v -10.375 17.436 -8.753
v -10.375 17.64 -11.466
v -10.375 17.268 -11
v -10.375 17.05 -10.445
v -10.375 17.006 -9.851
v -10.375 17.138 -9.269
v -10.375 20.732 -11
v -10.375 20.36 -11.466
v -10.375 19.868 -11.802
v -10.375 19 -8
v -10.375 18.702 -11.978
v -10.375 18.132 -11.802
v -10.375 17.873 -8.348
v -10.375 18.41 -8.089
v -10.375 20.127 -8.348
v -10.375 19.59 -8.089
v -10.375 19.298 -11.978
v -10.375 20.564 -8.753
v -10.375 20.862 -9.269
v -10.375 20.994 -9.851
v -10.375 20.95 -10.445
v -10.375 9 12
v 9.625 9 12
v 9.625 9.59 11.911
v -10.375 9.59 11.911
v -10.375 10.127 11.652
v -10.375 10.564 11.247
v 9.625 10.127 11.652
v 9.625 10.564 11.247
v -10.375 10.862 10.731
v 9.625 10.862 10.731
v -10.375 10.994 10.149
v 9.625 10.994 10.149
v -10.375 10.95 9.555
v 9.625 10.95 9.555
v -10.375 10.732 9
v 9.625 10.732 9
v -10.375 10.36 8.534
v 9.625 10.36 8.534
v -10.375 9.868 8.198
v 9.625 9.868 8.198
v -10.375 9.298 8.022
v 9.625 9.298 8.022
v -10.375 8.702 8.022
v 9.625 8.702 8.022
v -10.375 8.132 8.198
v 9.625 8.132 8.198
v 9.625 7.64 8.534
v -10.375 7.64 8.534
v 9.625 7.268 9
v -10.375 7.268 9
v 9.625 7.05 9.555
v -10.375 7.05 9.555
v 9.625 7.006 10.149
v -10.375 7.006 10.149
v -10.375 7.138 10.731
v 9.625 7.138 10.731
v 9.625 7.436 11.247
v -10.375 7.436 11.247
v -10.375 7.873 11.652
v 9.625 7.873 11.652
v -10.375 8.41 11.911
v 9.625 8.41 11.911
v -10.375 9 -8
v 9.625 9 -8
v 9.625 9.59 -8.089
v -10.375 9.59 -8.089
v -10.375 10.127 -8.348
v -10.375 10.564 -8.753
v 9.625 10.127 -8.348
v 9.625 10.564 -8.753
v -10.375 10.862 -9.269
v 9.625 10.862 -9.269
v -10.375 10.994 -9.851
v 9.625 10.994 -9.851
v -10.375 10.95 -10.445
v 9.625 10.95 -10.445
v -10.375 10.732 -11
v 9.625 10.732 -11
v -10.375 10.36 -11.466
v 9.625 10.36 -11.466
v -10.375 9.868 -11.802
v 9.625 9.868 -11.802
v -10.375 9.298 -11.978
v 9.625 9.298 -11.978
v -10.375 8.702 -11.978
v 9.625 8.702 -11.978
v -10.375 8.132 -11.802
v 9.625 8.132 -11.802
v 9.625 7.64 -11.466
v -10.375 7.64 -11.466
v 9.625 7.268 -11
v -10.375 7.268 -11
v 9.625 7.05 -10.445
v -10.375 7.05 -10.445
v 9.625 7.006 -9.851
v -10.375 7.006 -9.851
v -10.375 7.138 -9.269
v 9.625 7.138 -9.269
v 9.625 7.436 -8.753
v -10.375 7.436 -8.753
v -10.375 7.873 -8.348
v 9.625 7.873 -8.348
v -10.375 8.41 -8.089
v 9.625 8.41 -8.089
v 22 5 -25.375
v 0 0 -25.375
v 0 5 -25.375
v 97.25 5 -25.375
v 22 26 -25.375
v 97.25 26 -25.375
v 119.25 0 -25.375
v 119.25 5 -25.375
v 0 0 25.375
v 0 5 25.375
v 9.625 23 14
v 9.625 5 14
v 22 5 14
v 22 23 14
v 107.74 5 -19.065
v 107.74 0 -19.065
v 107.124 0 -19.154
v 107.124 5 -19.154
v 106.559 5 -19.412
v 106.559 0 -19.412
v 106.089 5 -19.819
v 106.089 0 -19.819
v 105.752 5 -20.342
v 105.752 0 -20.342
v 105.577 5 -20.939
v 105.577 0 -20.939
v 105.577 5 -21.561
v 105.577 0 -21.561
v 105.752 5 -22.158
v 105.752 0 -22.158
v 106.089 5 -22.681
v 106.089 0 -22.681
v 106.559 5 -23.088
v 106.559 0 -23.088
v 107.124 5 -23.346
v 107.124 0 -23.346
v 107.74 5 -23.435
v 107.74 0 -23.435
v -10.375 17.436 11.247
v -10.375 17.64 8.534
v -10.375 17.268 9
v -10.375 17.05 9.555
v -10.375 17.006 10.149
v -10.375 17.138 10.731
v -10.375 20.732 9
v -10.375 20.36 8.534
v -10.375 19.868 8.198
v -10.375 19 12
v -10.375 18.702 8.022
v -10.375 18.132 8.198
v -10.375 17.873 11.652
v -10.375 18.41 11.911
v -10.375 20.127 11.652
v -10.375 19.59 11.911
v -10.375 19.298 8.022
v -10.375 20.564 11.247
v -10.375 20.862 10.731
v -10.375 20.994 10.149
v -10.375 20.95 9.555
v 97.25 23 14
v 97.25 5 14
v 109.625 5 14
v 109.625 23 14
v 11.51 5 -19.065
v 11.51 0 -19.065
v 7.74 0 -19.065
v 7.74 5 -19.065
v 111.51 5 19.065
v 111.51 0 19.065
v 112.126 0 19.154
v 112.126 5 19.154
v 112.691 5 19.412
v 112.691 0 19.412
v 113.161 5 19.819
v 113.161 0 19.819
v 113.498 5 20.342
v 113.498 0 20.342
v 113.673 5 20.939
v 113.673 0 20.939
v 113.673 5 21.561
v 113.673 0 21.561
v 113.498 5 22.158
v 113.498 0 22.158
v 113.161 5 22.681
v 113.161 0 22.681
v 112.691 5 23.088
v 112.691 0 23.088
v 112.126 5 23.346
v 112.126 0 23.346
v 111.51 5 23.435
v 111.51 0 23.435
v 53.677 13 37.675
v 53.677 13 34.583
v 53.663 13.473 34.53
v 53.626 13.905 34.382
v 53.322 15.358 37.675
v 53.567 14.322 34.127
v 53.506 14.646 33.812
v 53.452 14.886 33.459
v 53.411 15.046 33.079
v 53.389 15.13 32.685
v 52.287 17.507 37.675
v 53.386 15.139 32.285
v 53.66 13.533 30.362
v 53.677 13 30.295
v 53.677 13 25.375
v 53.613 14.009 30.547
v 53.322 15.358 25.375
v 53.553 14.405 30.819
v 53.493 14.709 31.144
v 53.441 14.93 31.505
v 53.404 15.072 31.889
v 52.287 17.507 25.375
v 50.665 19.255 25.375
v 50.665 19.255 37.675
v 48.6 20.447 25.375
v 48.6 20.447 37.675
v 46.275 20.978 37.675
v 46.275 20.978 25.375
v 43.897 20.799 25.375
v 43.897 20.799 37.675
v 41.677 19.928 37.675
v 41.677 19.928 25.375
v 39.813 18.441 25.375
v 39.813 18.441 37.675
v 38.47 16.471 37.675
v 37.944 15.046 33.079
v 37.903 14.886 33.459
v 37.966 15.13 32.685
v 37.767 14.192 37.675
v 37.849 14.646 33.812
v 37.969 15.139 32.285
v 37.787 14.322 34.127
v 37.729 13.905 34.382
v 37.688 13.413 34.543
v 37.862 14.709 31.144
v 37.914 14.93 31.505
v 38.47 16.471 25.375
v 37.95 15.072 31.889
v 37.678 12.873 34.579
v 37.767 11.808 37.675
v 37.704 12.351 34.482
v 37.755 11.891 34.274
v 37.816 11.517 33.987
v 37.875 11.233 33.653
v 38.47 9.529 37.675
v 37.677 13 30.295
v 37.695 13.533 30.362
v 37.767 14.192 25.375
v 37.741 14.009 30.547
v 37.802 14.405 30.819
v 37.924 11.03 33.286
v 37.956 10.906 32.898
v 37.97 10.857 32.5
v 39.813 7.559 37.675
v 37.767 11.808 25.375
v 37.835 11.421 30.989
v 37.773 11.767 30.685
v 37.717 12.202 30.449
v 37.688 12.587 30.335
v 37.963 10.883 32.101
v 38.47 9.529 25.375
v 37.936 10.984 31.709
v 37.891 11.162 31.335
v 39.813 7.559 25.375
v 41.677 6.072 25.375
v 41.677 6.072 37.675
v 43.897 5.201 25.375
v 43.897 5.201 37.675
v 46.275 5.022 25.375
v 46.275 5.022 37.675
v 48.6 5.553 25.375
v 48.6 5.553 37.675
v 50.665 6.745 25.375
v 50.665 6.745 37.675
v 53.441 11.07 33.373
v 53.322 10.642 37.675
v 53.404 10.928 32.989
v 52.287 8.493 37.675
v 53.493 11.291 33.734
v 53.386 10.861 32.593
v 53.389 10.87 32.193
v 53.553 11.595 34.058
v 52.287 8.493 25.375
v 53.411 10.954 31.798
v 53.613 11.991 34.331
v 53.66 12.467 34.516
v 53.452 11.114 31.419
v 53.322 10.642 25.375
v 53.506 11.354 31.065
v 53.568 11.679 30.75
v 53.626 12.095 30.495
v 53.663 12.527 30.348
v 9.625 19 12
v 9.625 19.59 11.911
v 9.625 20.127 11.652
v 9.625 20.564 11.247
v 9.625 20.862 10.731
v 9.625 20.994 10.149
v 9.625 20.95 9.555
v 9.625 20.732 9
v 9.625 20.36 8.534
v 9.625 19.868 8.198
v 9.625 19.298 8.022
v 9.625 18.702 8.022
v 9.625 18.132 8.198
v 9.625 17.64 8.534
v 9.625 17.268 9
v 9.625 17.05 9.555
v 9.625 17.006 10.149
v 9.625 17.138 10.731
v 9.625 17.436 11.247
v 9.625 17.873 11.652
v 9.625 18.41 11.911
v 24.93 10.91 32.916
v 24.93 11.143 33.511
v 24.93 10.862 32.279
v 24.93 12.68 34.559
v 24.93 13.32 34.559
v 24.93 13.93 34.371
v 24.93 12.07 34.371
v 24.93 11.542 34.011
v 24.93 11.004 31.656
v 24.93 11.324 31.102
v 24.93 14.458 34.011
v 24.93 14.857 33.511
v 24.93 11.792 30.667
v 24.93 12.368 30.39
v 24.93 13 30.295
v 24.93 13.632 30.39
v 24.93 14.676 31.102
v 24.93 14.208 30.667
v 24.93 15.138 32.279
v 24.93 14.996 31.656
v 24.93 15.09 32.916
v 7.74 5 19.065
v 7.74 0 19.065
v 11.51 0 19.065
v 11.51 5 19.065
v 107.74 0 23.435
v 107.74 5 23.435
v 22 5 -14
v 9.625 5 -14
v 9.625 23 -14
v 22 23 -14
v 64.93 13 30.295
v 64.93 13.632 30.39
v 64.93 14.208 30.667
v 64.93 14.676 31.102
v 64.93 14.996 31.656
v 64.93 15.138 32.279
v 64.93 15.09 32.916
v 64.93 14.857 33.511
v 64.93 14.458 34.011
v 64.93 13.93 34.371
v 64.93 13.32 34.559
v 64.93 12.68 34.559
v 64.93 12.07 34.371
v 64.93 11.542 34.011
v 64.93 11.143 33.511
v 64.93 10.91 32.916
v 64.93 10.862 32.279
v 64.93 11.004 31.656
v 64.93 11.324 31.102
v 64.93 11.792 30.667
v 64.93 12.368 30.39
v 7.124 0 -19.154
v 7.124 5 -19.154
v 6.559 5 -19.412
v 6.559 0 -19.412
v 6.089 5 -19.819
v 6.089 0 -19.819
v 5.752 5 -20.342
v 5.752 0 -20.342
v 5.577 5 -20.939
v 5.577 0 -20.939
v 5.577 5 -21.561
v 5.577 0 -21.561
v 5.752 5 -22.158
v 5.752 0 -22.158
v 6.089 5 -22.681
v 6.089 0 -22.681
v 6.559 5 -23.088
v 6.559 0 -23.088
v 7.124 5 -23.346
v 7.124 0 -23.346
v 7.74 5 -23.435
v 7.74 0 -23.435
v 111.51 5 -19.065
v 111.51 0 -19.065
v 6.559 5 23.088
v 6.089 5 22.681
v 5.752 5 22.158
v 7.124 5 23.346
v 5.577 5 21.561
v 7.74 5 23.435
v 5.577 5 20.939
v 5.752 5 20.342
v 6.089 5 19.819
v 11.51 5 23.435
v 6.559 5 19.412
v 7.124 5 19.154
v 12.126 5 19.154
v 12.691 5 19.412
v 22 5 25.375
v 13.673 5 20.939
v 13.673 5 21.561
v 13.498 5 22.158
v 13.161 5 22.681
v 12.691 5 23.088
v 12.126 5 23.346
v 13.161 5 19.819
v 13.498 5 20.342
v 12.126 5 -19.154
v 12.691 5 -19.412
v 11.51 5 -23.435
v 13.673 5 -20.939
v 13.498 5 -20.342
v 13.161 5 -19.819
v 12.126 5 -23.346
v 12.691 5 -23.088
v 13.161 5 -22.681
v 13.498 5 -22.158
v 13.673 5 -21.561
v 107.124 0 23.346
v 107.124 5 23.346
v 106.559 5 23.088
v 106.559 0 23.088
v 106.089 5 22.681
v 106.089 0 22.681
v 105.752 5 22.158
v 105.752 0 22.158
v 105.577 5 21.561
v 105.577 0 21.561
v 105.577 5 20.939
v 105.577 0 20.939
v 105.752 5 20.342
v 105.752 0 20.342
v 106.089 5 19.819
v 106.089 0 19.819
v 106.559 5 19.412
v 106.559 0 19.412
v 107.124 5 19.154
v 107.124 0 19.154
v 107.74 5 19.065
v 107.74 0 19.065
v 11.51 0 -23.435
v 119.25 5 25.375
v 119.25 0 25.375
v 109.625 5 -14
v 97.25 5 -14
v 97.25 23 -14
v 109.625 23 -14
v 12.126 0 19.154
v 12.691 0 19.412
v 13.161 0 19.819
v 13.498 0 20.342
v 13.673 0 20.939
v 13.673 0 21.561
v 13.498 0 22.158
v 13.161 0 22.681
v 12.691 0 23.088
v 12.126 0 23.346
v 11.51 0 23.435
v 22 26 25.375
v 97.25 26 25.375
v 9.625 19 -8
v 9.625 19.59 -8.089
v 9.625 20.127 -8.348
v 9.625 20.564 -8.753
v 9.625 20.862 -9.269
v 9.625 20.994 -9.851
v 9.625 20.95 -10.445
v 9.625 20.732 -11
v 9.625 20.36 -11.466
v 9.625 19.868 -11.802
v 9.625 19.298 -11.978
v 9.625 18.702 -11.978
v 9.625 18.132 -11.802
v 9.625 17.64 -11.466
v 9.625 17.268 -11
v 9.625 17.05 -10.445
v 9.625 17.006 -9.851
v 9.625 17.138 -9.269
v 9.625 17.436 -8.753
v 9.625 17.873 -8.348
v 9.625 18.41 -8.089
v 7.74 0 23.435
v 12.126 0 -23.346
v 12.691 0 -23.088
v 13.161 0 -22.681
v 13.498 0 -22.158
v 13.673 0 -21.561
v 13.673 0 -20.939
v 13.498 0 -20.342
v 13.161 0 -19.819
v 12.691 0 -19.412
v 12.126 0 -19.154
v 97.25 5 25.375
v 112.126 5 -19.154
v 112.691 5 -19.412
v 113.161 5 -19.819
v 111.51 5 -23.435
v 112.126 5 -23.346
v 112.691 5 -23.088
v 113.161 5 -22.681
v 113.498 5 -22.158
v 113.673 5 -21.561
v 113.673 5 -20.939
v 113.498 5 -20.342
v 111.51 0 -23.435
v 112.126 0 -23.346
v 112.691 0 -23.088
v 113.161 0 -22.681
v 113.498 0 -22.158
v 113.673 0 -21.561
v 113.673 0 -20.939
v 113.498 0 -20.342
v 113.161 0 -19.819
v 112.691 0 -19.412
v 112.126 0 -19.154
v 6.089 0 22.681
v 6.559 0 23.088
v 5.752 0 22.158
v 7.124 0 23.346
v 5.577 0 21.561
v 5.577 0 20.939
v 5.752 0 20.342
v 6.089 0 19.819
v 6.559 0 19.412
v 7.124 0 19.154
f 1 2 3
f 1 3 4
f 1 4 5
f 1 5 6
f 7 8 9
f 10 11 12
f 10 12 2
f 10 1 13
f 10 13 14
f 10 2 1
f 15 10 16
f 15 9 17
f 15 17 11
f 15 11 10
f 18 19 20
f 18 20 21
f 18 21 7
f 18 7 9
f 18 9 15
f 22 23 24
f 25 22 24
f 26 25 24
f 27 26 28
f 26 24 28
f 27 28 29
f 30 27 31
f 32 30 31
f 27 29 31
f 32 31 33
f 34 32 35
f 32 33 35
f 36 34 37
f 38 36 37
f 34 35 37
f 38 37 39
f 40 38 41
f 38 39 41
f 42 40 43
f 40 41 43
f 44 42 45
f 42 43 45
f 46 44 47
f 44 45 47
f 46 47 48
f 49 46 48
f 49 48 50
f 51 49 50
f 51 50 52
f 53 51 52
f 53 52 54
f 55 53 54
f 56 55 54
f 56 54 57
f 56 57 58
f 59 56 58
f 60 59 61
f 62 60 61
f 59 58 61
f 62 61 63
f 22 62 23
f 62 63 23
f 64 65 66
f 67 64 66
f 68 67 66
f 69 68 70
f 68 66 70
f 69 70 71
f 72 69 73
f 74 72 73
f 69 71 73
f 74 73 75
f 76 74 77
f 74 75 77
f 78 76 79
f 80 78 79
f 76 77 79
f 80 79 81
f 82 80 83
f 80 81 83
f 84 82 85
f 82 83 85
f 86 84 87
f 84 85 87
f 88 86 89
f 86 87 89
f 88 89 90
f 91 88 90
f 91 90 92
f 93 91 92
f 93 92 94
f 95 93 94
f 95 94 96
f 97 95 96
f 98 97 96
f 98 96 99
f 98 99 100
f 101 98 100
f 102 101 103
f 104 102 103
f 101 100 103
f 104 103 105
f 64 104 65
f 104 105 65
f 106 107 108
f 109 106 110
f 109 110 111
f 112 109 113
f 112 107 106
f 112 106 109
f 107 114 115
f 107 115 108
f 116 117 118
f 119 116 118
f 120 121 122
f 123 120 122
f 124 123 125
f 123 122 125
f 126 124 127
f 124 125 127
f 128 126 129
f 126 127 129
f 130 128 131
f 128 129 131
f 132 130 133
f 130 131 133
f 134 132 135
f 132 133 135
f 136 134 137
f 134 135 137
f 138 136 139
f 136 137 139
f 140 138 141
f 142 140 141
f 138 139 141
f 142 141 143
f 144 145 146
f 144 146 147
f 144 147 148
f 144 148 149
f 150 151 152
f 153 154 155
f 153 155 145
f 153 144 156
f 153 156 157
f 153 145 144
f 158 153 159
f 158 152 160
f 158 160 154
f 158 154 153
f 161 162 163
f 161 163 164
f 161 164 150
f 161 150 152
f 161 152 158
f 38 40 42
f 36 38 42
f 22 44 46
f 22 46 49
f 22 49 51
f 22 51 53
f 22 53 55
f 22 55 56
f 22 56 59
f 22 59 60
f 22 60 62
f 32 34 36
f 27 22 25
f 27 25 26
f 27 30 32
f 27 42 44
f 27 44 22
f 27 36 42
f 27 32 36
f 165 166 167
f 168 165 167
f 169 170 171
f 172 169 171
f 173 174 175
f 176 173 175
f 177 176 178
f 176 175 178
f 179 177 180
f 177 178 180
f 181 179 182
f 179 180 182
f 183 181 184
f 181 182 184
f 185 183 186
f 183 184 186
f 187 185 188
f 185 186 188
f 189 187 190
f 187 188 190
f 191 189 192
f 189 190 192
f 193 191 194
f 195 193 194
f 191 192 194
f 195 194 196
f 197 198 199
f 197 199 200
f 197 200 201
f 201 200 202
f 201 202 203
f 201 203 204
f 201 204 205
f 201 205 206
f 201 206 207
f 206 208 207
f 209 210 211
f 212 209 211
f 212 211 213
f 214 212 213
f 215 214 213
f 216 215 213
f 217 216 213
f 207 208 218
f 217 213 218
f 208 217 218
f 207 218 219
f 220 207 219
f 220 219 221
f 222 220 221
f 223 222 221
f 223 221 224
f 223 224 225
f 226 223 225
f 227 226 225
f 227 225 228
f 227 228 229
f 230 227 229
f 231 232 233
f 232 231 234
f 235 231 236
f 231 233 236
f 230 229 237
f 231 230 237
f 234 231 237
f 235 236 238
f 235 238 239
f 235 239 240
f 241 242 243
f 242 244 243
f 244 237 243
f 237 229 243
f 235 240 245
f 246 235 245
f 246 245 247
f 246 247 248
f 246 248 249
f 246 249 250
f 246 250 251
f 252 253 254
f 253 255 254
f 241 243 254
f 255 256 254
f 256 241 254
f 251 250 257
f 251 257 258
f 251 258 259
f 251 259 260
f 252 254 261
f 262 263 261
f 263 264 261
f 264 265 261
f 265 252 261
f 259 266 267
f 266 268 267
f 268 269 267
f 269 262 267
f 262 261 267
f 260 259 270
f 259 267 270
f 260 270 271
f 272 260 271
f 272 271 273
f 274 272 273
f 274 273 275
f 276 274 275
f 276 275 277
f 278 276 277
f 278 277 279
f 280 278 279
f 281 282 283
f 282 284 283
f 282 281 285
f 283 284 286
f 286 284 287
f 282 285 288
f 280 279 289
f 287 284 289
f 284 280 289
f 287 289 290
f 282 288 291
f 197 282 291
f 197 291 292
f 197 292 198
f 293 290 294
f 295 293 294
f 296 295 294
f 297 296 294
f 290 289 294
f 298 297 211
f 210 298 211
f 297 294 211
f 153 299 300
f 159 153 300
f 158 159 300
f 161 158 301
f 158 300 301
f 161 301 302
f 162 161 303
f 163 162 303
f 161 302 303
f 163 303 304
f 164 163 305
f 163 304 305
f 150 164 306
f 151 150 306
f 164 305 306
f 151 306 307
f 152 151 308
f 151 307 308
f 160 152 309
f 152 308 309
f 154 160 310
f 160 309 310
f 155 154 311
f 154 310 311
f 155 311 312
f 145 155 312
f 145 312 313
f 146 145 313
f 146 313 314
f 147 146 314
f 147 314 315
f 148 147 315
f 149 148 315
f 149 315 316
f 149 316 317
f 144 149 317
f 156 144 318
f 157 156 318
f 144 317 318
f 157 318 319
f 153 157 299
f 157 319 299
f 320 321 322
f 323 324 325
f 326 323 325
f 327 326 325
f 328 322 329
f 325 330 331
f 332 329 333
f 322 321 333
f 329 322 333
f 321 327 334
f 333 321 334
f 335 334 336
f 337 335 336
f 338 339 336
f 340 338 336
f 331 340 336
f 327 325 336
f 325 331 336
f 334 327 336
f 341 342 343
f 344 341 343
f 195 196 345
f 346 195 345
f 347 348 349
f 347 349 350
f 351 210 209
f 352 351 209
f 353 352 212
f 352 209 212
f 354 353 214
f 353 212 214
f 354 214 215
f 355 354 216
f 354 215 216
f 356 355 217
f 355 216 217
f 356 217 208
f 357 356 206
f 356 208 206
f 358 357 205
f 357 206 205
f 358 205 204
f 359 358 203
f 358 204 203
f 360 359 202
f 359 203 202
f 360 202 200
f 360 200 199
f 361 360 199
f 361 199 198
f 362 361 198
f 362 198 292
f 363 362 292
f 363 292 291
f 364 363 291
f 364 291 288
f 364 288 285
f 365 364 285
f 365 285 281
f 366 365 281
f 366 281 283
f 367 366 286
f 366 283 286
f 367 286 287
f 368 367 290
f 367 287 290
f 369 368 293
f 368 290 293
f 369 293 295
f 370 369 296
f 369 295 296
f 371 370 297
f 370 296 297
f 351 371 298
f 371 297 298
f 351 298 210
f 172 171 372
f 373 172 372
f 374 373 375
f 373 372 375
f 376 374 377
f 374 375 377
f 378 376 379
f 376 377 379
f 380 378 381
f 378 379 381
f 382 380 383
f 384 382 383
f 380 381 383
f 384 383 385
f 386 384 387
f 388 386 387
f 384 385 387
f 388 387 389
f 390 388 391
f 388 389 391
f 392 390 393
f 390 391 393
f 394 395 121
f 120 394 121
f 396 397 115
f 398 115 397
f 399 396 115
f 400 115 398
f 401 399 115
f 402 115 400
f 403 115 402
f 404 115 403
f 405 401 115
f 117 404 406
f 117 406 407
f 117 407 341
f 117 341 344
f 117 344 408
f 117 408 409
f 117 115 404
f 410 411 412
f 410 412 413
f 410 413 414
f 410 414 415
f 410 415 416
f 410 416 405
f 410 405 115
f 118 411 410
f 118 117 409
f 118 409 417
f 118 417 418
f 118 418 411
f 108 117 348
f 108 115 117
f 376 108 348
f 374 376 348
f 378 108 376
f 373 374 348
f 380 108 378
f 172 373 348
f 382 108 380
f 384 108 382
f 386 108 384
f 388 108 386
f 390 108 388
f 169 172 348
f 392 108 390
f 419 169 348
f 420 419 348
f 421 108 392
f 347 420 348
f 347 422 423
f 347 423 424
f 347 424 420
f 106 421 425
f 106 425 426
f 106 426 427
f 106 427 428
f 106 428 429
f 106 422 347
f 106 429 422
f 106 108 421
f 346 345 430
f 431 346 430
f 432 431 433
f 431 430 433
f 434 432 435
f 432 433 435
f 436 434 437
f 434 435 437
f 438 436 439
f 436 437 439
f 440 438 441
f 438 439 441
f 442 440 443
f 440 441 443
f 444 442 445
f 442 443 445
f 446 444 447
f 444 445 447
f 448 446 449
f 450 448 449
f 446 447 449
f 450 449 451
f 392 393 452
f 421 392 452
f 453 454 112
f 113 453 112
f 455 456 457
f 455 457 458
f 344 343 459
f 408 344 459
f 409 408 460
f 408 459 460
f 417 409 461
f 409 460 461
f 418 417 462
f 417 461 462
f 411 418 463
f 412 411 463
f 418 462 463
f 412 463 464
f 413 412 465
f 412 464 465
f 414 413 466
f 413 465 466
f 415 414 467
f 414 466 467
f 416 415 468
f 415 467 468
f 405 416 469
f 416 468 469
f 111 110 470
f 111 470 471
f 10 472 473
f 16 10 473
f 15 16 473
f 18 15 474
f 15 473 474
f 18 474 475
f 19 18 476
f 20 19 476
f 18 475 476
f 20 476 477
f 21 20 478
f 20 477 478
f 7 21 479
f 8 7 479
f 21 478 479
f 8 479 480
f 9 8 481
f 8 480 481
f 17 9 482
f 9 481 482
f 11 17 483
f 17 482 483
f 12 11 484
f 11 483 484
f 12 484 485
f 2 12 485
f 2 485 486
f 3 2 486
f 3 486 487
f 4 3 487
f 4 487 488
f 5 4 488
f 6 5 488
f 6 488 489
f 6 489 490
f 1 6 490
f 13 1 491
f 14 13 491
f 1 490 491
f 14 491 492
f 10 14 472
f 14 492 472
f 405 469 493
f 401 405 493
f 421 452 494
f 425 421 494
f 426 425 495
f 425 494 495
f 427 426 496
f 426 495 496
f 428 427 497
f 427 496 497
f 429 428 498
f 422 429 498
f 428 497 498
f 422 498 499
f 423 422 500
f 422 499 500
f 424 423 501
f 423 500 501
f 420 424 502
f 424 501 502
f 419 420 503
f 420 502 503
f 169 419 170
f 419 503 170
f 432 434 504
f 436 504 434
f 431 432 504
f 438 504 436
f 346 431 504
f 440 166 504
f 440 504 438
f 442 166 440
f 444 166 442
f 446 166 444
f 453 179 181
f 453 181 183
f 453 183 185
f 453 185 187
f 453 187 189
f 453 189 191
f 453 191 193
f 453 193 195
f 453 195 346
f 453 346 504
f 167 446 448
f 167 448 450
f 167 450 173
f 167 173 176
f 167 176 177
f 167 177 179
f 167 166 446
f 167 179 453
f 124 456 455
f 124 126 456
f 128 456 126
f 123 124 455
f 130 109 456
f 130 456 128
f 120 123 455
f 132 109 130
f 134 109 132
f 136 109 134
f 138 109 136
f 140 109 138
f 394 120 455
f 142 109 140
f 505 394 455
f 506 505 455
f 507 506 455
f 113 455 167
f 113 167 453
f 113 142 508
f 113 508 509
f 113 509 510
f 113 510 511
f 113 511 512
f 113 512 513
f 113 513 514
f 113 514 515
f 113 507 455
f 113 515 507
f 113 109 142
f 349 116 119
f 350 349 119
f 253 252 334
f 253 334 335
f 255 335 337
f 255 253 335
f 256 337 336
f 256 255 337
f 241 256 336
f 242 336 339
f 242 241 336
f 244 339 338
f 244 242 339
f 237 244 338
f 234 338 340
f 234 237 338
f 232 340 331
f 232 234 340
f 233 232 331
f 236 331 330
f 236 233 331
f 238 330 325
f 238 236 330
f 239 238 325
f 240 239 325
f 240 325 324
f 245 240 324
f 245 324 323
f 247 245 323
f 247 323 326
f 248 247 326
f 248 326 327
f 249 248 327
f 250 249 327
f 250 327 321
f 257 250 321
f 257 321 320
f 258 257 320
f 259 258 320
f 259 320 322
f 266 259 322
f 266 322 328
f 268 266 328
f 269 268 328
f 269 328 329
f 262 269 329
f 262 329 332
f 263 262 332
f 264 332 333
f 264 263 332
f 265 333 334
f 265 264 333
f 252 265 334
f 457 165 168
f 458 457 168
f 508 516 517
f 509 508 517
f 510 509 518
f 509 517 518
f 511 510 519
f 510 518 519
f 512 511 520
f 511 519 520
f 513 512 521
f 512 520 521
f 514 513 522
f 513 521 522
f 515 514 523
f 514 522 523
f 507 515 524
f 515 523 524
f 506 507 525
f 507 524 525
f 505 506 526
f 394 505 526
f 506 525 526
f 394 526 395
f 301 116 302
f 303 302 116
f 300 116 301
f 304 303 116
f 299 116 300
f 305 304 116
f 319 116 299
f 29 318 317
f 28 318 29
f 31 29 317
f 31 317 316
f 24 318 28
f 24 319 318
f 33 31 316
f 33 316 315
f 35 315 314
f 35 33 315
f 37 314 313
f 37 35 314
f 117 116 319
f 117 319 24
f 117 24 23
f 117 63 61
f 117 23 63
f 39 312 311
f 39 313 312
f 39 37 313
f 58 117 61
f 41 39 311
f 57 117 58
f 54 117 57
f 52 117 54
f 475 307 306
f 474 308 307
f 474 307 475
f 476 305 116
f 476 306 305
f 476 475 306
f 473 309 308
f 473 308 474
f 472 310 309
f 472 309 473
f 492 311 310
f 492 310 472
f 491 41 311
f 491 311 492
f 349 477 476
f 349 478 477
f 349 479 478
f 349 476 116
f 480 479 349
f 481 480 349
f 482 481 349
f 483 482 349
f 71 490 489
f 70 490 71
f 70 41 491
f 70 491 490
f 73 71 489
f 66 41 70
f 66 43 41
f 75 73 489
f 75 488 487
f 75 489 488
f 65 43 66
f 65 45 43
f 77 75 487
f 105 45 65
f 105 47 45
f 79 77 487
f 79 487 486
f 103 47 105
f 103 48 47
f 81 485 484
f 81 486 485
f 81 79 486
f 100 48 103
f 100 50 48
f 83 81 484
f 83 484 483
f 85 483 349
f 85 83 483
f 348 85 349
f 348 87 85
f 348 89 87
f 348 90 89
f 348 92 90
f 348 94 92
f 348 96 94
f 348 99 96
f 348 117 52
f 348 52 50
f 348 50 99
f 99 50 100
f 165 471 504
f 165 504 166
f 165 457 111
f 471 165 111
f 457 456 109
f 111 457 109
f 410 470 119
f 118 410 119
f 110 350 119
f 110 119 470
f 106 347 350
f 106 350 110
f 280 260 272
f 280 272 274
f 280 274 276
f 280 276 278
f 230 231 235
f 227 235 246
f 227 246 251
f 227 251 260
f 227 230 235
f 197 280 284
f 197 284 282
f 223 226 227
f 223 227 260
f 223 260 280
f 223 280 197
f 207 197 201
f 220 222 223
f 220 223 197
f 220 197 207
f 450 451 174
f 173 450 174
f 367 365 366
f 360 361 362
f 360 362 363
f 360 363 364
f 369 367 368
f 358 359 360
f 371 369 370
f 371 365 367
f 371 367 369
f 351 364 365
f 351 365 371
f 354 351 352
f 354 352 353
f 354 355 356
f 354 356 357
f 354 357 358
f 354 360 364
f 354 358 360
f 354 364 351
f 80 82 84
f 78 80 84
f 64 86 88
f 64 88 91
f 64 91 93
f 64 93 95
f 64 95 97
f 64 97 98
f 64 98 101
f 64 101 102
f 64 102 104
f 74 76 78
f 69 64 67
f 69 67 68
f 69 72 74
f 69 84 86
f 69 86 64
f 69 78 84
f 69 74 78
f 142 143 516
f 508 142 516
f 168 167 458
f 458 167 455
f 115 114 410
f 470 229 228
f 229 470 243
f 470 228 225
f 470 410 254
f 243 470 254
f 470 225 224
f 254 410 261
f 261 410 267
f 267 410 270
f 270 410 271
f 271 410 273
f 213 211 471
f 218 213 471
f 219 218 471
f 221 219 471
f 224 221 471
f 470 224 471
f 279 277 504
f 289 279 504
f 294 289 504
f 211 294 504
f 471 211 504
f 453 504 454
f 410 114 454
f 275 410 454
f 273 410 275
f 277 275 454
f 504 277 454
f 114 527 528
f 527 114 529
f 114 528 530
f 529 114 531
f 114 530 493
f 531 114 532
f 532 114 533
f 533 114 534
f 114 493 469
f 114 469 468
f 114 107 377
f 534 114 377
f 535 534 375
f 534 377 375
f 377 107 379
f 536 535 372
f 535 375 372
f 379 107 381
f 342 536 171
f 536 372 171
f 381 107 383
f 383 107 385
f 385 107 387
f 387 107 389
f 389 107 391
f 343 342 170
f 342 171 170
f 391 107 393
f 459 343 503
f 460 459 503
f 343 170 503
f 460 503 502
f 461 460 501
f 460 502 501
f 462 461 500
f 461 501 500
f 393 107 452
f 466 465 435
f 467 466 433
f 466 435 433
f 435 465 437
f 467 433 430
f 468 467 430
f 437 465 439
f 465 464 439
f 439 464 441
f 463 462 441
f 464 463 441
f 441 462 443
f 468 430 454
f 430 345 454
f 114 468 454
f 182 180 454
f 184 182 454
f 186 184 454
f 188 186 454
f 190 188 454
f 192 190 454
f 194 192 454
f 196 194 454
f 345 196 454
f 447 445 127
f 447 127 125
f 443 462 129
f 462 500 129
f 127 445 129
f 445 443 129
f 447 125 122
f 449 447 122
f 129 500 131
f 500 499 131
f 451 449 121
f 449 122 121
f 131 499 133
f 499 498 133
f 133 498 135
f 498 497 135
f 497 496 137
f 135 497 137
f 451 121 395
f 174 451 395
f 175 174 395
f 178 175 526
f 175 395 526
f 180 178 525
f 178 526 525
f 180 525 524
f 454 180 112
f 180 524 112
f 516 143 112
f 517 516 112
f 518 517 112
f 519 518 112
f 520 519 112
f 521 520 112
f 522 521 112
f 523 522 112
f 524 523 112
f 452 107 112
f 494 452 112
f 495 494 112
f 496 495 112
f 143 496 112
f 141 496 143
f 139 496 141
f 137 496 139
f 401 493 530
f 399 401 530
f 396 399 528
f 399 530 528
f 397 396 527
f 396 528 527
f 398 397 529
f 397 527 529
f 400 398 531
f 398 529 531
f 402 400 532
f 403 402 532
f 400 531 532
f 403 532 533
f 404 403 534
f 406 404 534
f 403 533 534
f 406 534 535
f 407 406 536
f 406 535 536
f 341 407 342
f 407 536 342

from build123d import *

# Parameters (mm, degrees)
SKETCH1_W           = 119.25
SKETCH1_H           = 50.75
EXTRUDE1_DEPTH      = 5
SKETCH2_W           = 75.25
SKETCH2_H           = 50.75
EXTRUDE2_DEPTH      = 21
SKETCH3_W           = 100
SKETCH3_H           = 28
EXTRUDE3_DEPTH      = 18
SKETCH4_R           = 8
EXTRUDE4_DEPTH      = 12.3
EXTRUDE5_START      = -52.32
SKETCH5_R           = 2.144071556
EXTRUDE5_DEPTH      = 20
EXTRUDE5_DEPTH_BACK = 20
SKETCH6_R           = 2
EXTRUDE6_DEPTH      = 20


with BuildPart() as part:
    # Sketch1 → Extrude1 (new body)
    with BuildSketch(Plane(origin=(0, 0, 0), x_dir=(1, 0, 0), z_dir=(0, 1, 0))):
        with Locations((59.625, 0)):
            Rectangle(SKETCH1_W, SKETCH1_H)
        with BuildLine():
            Line((107.74, 23.435), (111.51, 23.435))
            ThreePointArc((111.51, 23.435), (113.695, 21.25), (111.51, 19.065))
            Line((111.51, 19.065), (107.74, 19.065))
            ThreePointArc((107.74, 19.065), (105.555, 21.25), (107.74, 23.435))
        make_face(mode=Mode.SUBTRACT)
        with BuildLine():
            Line((107.74, -19.065), (111.51, -19.065))
            ThreePointArc((111.51, -19.065), (113.695, -21.25), (111.51, -23.435))
            Line((111.51, -23.435), (107.74, -23.435))
            ThreePointArc((107.74, -23.435), (105.555, -21.25), (107.74, -19.065))
        make_face(mode=Mode.SUBTRACT)
        with BuildLine():
            Line((7.74, -19.065), (11.51, -19.065))
            ThreePointArc((11.51, -19.065), (13.695, -21.25), (11.51, -23.435))
            Line((11.51, -23.435), (7.74, -23.435))
            ThreePointArc((7.74, -23.435), (5.555, -21.25), (7.74, -19.065))
        make_face(mode=Mode.SUBTRACT)
        with BuildLine():
            Line((7.74, 23.435), (11.51, 23.435))
            ThreePointArc((11.51, 23.435), (13.695, 21.25), (11.51, 19.065))
            Line((11.51, 19.065), (7.74, 19.065))
            ThreePointArc((7.74, 19.065), (5.555, 21.25), (7.74, 23.435))
        make_face(mode=Mode.SUBTRACT)
    extrude(amount=EXTRUDE1_DEPTH)

    # Sketch2 → Extrude2 (add)
    with BuildSketch(Plane(origin=(0, 5, 0), x_dir=(1, 0, 0), z_dir=(0, 1, 0))):
        with Locations((59.625, 0)):
            Rectangle(SKETCH2_W, SKETCH2_H)
    extrude(amount=EXTRUDE2_DEPTH)

    # Sketch3 → Extrude3 (add)
    with BuildSketch(Plane(origin=(0, 5, 0), x_dir=(1, 0, 0), z_dir=(0, 1, 0))):
        with Locations((59.625, 0)):
            Rectangle(SKETCH3_W, SKETCH3_H)
    extrude(amount=EXTRUDE3_DEPTH)

    # Sketch4 → Extrude4 (add)
    with BuildSketch(Plane.XY.offset(25.375)):
        with Locations((45.677401857, 13)):
            Circle(SKETCH4_R)
    extrude(amount=EXTRUDE4_DEPTH)

    # Sketch5 → Extrude5 (add, two sides)
    with BuildSketch(Plane(origin=(97.25, 0, 0), x_dir=(0, 0, -1), z_dir=(1, 0, 0)).offset(EXTRUDE5_START)) as extrude5_sk:
        with Locations((-32.438828155, 13)):
            Circle(SKETCH5_R)
    extrude(amount=EXTRUDE5_DEPTH)
    extrude(extrude5_sk.sketch, amount=-EXTRUDE5_DEPTH_BACK)

    # Sketch6 → Extrude6 (add)
    with BuildSketch(Plane.ZY.offset(-9.625)):
        with Locations((-10, 9)):
            Circle(SKETCH6_R)
        with Locations((-10, 19)):
            Circle(SKETCH6_R)
        with Locations((10, 9)):
            Circle(SKETCH6_R)
        with Locations((10, 19)):
            Circle(SKETCH6_R)
    extrude(amount=EXTRUDE6_DEPTH)


solid = part.part
